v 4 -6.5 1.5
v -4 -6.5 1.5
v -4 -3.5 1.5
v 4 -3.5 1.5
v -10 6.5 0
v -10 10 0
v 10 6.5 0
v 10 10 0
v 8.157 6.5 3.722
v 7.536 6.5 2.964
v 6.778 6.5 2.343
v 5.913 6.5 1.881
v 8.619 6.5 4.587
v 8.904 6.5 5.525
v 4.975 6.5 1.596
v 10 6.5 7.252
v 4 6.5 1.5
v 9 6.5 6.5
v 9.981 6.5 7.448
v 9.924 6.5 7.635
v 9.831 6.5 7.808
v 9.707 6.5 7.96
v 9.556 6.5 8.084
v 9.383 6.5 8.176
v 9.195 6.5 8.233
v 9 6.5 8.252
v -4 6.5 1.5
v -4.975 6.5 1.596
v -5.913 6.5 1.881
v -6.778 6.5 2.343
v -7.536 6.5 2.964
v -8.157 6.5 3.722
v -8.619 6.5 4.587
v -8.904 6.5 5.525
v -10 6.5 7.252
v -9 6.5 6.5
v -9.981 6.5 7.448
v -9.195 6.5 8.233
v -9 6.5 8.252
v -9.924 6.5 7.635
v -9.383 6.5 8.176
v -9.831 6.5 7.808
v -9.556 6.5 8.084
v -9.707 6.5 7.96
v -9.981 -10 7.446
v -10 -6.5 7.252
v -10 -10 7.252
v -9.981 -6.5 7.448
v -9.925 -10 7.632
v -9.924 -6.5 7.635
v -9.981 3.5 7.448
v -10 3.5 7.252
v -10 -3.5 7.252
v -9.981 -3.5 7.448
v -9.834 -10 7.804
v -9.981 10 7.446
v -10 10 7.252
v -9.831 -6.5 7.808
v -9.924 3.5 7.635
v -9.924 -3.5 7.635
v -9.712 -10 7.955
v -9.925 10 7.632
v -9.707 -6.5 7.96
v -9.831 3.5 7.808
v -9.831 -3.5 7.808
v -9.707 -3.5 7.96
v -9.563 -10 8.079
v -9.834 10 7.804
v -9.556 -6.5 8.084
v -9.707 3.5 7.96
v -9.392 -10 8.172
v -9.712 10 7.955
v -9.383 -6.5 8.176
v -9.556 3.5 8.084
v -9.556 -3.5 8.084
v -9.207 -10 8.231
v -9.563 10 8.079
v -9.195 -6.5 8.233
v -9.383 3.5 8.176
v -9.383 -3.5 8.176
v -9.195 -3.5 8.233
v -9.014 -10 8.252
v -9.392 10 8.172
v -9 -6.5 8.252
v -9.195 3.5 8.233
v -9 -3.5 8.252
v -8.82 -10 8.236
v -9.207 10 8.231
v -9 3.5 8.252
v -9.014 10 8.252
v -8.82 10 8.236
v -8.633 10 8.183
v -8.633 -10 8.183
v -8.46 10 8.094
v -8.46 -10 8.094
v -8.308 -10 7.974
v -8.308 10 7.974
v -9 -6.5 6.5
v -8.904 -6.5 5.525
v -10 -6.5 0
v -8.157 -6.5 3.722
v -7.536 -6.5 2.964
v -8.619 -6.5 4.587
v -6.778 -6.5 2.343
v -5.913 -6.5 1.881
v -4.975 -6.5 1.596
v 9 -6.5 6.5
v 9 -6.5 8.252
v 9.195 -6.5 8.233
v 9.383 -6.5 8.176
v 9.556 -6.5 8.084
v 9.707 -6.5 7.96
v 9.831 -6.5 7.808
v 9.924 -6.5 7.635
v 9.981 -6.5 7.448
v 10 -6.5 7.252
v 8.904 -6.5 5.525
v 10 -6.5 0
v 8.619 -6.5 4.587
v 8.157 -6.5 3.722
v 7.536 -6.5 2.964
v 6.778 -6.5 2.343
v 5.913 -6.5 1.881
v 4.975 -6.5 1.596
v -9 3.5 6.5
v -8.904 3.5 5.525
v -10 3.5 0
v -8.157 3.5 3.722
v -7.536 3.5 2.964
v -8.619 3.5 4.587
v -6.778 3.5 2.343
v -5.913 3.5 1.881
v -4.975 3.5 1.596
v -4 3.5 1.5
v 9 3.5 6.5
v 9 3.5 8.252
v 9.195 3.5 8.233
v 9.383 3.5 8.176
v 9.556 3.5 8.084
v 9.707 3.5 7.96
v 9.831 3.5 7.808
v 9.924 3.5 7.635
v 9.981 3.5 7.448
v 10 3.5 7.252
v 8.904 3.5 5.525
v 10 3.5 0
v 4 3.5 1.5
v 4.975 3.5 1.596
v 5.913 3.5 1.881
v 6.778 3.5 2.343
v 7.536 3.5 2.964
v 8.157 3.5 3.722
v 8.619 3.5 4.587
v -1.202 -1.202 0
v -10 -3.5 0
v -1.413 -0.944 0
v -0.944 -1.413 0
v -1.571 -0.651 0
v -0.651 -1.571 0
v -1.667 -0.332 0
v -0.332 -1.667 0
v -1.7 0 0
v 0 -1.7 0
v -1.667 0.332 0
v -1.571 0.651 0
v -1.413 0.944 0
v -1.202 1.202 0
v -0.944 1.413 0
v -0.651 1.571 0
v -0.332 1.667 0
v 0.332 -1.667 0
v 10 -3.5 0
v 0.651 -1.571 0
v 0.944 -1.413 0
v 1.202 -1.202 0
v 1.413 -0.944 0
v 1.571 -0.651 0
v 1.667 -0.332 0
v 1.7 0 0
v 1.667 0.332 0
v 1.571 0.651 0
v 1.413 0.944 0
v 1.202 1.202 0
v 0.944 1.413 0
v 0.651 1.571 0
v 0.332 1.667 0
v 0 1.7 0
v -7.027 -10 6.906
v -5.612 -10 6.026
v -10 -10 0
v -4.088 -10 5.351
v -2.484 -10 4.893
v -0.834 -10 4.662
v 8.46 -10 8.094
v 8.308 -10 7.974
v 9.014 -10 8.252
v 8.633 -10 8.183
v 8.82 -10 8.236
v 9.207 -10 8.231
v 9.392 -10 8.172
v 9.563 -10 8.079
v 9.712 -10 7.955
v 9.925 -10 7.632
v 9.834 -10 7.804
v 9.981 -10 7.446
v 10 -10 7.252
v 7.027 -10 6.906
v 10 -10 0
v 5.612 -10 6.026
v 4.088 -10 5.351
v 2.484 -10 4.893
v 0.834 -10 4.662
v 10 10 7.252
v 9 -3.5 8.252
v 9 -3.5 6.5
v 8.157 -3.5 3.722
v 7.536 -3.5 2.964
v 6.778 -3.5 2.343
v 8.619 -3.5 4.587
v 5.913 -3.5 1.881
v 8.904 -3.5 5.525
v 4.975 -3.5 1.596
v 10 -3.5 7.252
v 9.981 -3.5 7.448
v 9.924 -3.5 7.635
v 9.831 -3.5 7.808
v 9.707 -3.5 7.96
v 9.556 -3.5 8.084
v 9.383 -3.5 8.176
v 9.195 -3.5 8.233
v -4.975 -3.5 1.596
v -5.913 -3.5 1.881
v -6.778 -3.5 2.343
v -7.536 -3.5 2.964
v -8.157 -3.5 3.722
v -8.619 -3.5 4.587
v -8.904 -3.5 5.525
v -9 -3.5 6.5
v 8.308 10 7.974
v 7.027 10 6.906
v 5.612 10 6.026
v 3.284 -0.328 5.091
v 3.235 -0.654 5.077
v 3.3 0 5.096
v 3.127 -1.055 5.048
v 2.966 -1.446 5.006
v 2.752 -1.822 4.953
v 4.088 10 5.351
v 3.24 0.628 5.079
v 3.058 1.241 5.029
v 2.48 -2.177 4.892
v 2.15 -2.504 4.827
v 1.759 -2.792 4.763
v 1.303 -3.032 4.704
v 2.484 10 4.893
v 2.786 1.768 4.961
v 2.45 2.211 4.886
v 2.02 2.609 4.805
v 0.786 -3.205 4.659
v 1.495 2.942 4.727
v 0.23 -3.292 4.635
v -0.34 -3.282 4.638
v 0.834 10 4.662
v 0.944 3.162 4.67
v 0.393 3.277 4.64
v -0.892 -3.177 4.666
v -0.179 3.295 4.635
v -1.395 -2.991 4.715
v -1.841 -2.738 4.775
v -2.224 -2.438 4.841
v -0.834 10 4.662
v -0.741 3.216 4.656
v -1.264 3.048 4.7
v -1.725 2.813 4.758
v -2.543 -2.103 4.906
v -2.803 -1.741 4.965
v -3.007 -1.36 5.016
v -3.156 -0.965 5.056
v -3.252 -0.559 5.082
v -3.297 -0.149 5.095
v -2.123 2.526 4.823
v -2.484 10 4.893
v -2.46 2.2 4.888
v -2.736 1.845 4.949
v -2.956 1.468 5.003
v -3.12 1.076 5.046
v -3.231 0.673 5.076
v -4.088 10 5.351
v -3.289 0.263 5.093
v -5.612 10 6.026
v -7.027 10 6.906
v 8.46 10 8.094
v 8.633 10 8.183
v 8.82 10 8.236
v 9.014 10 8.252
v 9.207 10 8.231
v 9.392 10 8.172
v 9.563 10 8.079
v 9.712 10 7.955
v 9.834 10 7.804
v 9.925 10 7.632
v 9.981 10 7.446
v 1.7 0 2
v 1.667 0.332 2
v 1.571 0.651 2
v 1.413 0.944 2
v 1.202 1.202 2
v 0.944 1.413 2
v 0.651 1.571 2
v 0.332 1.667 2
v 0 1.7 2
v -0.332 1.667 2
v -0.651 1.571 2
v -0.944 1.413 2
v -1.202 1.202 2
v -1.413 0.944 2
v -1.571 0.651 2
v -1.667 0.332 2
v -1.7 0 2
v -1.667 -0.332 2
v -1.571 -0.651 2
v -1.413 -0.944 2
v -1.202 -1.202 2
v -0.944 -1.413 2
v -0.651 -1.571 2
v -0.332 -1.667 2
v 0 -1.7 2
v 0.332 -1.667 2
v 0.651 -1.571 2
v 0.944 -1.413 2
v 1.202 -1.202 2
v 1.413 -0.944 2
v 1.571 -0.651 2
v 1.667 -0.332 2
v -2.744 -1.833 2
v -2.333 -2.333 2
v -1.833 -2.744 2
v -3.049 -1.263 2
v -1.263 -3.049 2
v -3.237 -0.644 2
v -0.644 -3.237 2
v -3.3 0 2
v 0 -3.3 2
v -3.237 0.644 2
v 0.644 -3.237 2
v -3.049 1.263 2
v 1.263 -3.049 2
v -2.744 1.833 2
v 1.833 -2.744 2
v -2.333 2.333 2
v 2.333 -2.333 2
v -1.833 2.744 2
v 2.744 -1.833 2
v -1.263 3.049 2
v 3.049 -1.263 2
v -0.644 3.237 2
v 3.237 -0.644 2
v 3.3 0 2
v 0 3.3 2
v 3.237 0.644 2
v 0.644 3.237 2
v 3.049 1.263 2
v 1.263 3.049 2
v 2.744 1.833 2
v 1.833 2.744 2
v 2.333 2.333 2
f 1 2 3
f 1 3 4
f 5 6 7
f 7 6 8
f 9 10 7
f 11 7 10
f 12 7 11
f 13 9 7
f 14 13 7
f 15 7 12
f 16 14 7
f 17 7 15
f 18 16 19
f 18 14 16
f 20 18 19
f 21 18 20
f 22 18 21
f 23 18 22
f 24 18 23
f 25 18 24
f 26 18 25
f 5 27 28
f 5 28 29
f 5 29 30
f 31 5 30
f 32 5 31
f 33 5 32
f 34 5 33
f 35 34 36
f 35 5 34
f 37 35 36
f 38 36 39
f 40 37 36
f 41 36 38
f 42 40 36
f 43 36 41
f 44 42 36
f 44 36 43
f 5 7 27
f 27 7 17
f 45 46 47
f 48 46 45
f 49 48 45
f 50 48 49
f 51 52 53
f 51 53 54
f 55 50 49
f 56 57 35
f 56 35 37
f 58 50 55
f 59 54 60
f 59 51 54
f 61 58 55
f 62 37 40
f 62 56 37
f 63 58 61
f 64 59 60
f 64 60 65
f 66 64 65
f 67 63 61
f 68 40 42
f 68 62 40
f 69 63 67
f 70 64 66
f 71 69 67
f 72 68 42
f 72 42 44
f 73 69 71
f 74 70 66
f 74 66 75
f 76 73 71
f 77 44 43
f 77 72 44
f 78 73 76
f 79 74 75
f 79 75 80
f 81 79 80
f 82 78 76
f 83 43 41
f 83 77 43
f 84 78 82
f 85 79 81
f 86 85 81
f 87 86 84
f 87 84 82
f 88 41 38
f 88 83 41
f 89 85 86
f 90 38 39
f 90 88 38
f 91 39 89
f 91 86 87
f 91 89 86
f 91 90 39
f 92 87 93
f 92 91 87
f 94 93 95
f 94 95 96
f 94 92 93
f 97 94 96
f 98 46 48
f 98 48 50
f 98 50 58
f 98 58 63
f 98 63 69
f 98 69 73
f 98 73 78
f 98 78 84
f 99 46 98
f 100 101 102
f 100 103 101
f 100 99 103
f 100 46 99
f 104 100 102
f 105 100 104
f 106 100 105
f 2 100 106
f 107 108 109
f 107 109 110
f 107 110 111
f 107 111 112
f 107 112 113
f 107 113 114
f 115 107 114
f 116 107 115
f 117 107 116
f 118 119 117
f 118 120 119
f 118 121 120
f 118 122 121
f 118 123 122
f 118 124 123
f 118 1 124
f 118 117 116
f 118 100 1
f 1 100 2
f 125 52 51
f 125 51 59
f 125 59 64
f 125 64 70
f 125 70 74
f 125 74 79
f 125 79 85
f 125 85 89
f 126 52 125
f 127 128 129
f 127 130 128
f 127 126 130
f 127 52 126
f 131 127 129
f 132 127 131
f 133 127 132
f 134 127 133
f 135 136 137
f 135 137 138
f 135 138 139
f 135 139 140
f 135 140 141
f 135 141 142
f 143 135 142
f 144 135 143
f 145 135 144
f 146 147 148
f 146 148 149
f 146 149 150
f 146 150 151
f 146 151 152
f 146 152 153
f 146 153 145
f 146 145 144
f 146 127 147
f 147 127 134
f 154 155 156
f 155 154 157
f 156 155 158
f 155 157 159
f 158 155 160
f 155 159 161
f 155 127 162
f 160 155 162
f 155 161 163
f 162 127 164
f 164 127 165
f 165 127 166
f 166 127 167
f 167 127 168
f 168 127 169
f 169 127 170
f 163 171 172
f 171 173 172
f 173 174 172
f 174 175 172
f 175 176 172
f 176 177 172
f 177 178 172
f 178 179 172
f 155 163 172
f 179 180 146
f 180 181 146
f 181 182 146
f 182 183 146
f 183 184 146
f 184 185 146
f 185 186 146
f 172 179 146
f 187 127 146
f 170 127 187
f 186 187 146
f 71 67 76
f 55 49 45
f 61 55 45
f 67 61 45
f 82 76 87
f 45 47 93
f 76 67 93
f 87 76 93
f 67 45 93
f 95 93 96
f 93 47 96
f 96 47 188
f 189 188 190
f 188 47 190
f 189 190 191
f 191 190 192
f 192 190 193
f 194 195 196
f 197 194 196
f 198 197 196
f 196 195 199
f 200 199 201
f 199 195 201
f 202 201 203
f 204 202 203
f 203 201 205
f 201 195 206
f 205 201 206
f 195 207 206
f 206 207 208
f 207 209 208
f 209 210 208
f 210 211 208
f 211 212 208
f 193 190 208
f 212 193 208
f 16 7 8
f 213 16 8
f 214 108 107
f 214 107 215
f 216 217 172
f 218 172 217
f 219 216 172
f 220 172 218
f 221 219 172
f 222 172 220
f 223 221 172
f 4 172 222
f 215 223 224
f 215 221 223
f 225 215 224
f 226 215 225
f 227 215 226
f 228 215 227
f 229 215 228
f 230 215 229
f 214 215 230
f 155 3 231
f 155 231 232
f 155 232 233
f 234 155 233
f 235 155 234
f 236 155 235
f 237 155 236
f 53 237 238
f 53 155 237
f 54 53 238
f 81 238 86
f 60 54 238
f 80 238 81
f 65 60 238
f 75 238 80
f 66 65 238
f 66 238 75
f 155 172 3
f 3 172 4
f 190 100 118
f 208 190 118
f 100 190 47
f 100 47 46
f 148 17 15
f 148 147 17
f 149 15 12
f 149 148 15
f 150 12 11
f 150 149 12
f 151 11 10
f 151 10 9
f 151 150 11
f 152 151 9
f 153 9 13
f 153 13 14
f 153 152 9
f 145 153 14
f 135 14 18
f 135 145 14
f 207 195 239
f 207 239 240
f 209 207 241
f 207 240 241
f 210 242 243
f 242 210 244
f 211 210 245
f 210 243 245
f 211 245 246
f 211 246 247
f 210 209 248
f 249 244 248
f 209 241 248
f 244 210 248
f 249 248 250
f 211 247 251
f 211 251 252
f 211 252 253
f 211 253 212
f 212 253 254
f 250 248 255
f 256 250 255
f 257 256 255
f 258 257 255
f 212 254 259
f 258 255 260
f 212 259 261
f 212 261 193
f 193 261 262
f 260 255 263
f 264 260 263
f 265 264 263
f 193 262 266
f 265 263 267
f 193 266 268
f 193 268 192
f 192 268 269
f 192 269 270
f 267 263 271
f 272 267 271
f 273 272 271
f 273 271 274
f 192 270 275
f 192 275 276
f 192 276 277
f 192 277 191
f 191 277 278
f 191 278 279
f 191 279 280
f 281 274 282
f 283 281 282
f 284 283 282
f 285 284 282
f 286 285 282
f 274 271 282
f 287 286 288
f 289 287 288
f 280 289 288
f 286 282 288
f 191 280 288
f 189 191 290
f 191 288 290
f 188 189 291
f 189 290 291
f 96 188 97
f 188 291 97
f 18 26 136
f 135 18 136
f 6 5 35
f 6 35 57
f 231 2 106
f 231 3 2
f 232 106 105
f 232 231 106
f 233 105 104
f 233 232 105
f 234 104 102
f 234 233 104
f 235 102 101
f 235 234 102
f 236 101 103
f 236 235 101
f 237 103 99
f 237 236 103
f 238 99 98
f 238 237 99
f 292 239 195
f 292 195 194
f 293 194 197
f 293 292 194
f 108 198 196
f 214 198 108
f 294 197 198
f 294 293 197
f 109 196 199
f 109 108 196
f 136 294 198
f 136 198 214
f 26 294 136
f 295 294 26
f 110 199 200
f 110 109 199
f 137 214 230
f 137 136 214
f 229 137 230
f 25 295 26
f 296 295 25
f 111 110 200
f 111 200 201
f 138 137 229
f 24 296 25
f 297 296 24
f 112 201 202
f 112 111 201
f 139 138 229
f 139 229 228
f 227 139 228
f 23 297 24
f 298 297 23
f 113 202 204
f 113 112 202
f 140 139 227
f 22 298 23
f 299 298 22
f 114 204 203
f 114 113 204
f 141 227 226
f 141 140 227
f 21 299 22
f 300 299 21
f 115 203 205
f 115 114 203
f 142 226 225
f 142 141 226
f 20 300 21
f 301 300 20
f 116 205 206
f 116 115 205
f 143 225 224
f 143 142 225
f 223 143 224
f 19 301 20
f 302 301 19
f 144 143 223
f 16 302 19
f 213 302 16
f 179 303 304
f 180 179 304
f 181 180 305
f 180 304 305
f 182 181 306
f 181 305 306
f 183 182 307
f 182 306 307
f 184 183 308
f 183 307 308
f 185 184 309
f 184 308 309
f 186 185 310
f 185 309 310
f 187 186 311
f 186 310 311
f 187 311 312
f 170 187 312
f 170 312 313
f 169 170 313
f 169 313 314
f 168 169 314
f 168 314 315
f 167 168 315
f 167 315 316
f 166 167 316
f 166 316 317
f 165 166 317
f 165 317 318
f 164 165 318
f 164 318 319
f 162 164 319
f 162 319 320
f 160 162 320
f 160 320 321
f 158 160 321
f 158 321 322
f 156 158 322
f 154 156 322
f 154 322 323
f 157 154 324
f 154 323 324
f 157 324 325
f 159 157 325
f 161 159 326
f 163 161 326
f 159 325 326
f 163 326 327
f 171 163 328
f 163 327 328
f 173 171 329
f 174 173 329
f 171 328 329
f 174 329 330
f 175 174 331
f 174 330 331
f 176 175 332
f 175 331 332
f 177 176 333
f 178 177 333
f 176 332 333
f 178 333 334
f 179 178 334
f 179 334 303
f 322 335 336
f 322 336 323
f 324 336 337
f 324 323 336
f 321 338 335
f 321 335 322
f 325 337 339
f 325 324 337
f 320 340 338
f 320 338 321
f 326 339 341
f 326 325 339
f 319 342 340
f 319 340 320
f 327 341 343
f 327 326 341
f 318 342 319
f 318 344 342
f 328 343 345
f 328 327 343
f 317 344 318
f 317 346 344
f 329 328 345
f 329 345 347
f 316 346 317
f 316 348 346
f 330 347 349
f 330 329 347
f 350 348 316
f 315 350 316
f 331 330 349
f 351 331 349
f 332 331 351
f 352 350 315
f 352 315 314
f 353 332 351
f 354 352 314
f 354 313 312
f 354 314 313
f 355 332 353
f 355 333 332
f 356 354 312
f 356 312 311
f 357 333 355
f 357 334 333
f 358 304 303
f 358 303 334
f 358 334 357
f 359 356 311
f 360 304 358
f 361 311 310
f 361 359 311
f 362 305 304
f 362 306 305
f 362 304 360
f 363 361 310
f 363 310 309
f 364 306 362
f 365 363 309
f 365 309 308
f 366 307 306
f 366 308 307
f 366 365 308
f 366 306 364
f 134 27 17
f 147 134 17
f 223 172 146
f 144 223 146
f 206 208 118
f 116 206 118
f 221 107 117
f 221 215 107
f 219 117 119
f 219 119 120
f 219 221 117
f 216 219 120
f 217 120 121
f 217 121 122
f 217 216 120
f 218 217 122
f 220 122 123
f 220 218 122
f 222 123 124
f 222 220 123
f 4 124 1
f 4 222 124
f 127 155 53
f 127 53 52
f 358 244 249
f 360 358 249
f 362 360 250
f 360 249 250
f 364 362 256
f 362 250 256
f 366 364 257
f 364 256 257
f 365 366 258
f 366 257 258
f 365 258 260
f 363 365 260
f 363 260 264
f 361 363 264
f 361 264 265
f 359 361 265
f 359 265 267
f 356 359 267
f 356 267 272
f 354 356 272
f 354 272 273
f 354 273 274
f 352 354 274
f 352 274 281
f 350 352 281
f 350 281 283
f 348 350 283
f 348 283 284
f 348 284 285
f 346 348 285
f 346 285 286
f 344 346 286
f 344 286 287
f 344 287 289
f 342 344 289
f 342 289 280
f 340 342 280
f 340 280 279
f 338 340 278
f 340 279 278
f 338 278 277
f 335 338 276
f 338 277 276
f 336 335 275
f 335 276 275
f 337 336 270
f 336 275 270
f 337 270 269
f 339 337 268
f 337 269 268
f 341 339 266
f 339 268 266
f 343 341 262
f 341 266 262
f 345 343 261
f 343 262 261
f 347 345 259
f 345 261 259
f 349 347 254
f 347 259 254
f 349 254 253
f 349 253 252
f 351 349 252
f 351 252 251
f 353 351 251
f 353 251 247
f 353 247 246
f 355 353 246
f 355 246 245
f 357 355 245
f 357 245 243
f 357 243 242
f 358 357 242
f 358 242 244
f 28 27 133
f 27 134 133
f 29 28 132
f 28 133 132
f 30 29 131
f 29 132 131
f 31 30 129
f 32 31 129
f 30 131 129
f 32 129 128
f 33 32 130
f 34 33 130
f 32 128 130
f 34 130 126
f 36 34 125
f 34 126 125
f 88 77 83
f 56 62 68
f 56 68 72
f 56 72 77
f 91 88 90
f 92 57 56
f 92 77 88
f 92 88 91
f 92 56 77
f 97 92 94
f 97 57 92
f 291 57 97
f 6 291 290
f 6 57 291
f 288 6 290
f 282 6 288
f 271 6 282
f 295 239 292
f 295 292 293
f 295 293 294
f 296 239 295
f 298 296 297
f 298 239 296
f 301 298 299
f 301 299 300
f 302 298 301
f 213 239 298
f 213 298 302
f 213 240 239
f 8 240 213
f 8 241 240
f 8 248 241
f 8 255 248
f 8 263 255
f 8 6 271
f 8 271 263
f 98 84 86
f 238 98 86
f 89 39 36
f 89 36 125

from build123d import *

# Parameters (mm, degrees)
SKETCH_W        = 20
SKETCH_H        = 20
PAD_DEPTH       = 10
SKETCH001_R     = 1.7
POCKET_DEPTH    = 10.001
SKETCH002_R     = 3.3
POCKET001_DEPTH = 8
POCKET002_DEPTH = 20.001
FILLET_R        = 1
SKETCH004_W     = 20
SKETCH004_H     = 3
POCKET003_DEPTH = 1.5
SKETCH005_W     = 3
SKETCH005_H     = 8
POCKET004_DEPTH = 1
SKETCH006_W     = 3
SKETCH006_H     = 8
POCKET005_DEPTH = 1
FILLET001_R     = 5


with BuildPart() as part:
    # Sketch → Pad (new body)
    with BuildSketch(Plane.XY):
        Rectangle(SKETCH_W, SKETCH_H)
    extrude(amount=PAD_DEPTH)

    # Sketch001 → Pocket (cut, through all)
    with BuildSketch(Plane.XY.offset(10)):
        Circle(SKETCH001_R)
    extrude(amount=-POCKET_DEPTH, mode=Mode.SUBTRACT)

    # Sketch002 → Pocket001 (cut)
    with BuildSketch(Plane.XY.offset(10)):
        Circle(SKETCH002_R)
    extrude(amount=-POCKET001_DEPTH, mode=Mode.SUBTRACT)

    # Sketch003 → Pocket002 (cut, through all)
    with BuildSketch(Plane(origin=(0, 10, 0), x_dir=(-1, 0, 0), z_dir=(0, 1, 0))):
        with BuildLine():
            ThreePointArc((-10, 10), (0, 4.63325), (10, 10))
            Line((-10, 10), (10, 10))
        make_face()
    extrude(amount=-POCKET002_DEPTH, mode=Mode.SUBTRACT)

    # Fillet
    fillet_edges = [part.edges().sort_by_distance(p)[0] for p in [
        (-10, 0, 10),
        (10, 0, 10),
    ]]
    fillet(fillet_edges, radius=FILLET_R)

    # Sketch004 → Pocket003 (cut)
    with BuildSketch(Plane(origin=(0, 0, 0), x_dir=(1, 0, 0), z_dir=(0, 0, -1))):
        with Locations((0, 5)):
            Rectangle(SKETCH004_W, SKETCH004_H)
    pocket003 = extrude(amount=-POCKET003_DEPTH, mode=Mode.SUBTRACT)

    # Mirrored: Pocket003 across Sketch004 H_Axis
    add(pocket003.mirror(Plane(origin=(0, 0, 0), x_dir=(0, 0, -1), z_dir=(0, -1, 0))), mode=Mode.SUBTRACT)

    # Sketch005 → Pocket004 (cut)
    with BuildSketch(Plane(origin=(-10, 0, 0), x_dir=(0, -1, 0), z_dir=(-1, 0, 0))):
        with Locations((-5, 5.5)):
            Rectangle(SKETCH005_W, SKETCH005_H)
    pocket004 = extrude(amount=-POCKET004_DEPTH, mode=Mode.SUBTRACT)

    # Mirrored001: Pocket004 across Sketch005 V_Axis
    add(pocket004.mirror(Plane(origin=(-10, 0, 0), x_dir=(-1, 0, 0), z_dir=(0, -1, 0))), mode=Mode.SUBTRACT)

    # Sketch006 → Pocket005 (cut)
    with BuildSketch(Plane.YZ.offset(10)):
        with Locations((-5, 5.5)):
            Rectangle(SKETCH006_W, SKETCH006_H)
    pocket005 = extrude(amount=-POCKET005_DEPTH, mode=Mode.SUBTRACT)

    # Mirrored002: Pocket005 across Sketch006 V_Axis
    add(pocket005.mirror(Plane(origin=(10, 0, 0), x_dir=(1, 0, 0), z_dir=(0, 1, 0))), mode=Mode.SUBTRACT)

    # Fillet001
    fillet001_edges = [part.edges().sort_by_distance(p)[0] for p in [
        (9, 5, 1.5),
        (9, -5, 1.5),
        (-9, -5, 1.5),
        (-9, 5, 1.5),
    ]]
    fillet(fillet001_edges, radius=FILLET001_R)


solid = part.part
